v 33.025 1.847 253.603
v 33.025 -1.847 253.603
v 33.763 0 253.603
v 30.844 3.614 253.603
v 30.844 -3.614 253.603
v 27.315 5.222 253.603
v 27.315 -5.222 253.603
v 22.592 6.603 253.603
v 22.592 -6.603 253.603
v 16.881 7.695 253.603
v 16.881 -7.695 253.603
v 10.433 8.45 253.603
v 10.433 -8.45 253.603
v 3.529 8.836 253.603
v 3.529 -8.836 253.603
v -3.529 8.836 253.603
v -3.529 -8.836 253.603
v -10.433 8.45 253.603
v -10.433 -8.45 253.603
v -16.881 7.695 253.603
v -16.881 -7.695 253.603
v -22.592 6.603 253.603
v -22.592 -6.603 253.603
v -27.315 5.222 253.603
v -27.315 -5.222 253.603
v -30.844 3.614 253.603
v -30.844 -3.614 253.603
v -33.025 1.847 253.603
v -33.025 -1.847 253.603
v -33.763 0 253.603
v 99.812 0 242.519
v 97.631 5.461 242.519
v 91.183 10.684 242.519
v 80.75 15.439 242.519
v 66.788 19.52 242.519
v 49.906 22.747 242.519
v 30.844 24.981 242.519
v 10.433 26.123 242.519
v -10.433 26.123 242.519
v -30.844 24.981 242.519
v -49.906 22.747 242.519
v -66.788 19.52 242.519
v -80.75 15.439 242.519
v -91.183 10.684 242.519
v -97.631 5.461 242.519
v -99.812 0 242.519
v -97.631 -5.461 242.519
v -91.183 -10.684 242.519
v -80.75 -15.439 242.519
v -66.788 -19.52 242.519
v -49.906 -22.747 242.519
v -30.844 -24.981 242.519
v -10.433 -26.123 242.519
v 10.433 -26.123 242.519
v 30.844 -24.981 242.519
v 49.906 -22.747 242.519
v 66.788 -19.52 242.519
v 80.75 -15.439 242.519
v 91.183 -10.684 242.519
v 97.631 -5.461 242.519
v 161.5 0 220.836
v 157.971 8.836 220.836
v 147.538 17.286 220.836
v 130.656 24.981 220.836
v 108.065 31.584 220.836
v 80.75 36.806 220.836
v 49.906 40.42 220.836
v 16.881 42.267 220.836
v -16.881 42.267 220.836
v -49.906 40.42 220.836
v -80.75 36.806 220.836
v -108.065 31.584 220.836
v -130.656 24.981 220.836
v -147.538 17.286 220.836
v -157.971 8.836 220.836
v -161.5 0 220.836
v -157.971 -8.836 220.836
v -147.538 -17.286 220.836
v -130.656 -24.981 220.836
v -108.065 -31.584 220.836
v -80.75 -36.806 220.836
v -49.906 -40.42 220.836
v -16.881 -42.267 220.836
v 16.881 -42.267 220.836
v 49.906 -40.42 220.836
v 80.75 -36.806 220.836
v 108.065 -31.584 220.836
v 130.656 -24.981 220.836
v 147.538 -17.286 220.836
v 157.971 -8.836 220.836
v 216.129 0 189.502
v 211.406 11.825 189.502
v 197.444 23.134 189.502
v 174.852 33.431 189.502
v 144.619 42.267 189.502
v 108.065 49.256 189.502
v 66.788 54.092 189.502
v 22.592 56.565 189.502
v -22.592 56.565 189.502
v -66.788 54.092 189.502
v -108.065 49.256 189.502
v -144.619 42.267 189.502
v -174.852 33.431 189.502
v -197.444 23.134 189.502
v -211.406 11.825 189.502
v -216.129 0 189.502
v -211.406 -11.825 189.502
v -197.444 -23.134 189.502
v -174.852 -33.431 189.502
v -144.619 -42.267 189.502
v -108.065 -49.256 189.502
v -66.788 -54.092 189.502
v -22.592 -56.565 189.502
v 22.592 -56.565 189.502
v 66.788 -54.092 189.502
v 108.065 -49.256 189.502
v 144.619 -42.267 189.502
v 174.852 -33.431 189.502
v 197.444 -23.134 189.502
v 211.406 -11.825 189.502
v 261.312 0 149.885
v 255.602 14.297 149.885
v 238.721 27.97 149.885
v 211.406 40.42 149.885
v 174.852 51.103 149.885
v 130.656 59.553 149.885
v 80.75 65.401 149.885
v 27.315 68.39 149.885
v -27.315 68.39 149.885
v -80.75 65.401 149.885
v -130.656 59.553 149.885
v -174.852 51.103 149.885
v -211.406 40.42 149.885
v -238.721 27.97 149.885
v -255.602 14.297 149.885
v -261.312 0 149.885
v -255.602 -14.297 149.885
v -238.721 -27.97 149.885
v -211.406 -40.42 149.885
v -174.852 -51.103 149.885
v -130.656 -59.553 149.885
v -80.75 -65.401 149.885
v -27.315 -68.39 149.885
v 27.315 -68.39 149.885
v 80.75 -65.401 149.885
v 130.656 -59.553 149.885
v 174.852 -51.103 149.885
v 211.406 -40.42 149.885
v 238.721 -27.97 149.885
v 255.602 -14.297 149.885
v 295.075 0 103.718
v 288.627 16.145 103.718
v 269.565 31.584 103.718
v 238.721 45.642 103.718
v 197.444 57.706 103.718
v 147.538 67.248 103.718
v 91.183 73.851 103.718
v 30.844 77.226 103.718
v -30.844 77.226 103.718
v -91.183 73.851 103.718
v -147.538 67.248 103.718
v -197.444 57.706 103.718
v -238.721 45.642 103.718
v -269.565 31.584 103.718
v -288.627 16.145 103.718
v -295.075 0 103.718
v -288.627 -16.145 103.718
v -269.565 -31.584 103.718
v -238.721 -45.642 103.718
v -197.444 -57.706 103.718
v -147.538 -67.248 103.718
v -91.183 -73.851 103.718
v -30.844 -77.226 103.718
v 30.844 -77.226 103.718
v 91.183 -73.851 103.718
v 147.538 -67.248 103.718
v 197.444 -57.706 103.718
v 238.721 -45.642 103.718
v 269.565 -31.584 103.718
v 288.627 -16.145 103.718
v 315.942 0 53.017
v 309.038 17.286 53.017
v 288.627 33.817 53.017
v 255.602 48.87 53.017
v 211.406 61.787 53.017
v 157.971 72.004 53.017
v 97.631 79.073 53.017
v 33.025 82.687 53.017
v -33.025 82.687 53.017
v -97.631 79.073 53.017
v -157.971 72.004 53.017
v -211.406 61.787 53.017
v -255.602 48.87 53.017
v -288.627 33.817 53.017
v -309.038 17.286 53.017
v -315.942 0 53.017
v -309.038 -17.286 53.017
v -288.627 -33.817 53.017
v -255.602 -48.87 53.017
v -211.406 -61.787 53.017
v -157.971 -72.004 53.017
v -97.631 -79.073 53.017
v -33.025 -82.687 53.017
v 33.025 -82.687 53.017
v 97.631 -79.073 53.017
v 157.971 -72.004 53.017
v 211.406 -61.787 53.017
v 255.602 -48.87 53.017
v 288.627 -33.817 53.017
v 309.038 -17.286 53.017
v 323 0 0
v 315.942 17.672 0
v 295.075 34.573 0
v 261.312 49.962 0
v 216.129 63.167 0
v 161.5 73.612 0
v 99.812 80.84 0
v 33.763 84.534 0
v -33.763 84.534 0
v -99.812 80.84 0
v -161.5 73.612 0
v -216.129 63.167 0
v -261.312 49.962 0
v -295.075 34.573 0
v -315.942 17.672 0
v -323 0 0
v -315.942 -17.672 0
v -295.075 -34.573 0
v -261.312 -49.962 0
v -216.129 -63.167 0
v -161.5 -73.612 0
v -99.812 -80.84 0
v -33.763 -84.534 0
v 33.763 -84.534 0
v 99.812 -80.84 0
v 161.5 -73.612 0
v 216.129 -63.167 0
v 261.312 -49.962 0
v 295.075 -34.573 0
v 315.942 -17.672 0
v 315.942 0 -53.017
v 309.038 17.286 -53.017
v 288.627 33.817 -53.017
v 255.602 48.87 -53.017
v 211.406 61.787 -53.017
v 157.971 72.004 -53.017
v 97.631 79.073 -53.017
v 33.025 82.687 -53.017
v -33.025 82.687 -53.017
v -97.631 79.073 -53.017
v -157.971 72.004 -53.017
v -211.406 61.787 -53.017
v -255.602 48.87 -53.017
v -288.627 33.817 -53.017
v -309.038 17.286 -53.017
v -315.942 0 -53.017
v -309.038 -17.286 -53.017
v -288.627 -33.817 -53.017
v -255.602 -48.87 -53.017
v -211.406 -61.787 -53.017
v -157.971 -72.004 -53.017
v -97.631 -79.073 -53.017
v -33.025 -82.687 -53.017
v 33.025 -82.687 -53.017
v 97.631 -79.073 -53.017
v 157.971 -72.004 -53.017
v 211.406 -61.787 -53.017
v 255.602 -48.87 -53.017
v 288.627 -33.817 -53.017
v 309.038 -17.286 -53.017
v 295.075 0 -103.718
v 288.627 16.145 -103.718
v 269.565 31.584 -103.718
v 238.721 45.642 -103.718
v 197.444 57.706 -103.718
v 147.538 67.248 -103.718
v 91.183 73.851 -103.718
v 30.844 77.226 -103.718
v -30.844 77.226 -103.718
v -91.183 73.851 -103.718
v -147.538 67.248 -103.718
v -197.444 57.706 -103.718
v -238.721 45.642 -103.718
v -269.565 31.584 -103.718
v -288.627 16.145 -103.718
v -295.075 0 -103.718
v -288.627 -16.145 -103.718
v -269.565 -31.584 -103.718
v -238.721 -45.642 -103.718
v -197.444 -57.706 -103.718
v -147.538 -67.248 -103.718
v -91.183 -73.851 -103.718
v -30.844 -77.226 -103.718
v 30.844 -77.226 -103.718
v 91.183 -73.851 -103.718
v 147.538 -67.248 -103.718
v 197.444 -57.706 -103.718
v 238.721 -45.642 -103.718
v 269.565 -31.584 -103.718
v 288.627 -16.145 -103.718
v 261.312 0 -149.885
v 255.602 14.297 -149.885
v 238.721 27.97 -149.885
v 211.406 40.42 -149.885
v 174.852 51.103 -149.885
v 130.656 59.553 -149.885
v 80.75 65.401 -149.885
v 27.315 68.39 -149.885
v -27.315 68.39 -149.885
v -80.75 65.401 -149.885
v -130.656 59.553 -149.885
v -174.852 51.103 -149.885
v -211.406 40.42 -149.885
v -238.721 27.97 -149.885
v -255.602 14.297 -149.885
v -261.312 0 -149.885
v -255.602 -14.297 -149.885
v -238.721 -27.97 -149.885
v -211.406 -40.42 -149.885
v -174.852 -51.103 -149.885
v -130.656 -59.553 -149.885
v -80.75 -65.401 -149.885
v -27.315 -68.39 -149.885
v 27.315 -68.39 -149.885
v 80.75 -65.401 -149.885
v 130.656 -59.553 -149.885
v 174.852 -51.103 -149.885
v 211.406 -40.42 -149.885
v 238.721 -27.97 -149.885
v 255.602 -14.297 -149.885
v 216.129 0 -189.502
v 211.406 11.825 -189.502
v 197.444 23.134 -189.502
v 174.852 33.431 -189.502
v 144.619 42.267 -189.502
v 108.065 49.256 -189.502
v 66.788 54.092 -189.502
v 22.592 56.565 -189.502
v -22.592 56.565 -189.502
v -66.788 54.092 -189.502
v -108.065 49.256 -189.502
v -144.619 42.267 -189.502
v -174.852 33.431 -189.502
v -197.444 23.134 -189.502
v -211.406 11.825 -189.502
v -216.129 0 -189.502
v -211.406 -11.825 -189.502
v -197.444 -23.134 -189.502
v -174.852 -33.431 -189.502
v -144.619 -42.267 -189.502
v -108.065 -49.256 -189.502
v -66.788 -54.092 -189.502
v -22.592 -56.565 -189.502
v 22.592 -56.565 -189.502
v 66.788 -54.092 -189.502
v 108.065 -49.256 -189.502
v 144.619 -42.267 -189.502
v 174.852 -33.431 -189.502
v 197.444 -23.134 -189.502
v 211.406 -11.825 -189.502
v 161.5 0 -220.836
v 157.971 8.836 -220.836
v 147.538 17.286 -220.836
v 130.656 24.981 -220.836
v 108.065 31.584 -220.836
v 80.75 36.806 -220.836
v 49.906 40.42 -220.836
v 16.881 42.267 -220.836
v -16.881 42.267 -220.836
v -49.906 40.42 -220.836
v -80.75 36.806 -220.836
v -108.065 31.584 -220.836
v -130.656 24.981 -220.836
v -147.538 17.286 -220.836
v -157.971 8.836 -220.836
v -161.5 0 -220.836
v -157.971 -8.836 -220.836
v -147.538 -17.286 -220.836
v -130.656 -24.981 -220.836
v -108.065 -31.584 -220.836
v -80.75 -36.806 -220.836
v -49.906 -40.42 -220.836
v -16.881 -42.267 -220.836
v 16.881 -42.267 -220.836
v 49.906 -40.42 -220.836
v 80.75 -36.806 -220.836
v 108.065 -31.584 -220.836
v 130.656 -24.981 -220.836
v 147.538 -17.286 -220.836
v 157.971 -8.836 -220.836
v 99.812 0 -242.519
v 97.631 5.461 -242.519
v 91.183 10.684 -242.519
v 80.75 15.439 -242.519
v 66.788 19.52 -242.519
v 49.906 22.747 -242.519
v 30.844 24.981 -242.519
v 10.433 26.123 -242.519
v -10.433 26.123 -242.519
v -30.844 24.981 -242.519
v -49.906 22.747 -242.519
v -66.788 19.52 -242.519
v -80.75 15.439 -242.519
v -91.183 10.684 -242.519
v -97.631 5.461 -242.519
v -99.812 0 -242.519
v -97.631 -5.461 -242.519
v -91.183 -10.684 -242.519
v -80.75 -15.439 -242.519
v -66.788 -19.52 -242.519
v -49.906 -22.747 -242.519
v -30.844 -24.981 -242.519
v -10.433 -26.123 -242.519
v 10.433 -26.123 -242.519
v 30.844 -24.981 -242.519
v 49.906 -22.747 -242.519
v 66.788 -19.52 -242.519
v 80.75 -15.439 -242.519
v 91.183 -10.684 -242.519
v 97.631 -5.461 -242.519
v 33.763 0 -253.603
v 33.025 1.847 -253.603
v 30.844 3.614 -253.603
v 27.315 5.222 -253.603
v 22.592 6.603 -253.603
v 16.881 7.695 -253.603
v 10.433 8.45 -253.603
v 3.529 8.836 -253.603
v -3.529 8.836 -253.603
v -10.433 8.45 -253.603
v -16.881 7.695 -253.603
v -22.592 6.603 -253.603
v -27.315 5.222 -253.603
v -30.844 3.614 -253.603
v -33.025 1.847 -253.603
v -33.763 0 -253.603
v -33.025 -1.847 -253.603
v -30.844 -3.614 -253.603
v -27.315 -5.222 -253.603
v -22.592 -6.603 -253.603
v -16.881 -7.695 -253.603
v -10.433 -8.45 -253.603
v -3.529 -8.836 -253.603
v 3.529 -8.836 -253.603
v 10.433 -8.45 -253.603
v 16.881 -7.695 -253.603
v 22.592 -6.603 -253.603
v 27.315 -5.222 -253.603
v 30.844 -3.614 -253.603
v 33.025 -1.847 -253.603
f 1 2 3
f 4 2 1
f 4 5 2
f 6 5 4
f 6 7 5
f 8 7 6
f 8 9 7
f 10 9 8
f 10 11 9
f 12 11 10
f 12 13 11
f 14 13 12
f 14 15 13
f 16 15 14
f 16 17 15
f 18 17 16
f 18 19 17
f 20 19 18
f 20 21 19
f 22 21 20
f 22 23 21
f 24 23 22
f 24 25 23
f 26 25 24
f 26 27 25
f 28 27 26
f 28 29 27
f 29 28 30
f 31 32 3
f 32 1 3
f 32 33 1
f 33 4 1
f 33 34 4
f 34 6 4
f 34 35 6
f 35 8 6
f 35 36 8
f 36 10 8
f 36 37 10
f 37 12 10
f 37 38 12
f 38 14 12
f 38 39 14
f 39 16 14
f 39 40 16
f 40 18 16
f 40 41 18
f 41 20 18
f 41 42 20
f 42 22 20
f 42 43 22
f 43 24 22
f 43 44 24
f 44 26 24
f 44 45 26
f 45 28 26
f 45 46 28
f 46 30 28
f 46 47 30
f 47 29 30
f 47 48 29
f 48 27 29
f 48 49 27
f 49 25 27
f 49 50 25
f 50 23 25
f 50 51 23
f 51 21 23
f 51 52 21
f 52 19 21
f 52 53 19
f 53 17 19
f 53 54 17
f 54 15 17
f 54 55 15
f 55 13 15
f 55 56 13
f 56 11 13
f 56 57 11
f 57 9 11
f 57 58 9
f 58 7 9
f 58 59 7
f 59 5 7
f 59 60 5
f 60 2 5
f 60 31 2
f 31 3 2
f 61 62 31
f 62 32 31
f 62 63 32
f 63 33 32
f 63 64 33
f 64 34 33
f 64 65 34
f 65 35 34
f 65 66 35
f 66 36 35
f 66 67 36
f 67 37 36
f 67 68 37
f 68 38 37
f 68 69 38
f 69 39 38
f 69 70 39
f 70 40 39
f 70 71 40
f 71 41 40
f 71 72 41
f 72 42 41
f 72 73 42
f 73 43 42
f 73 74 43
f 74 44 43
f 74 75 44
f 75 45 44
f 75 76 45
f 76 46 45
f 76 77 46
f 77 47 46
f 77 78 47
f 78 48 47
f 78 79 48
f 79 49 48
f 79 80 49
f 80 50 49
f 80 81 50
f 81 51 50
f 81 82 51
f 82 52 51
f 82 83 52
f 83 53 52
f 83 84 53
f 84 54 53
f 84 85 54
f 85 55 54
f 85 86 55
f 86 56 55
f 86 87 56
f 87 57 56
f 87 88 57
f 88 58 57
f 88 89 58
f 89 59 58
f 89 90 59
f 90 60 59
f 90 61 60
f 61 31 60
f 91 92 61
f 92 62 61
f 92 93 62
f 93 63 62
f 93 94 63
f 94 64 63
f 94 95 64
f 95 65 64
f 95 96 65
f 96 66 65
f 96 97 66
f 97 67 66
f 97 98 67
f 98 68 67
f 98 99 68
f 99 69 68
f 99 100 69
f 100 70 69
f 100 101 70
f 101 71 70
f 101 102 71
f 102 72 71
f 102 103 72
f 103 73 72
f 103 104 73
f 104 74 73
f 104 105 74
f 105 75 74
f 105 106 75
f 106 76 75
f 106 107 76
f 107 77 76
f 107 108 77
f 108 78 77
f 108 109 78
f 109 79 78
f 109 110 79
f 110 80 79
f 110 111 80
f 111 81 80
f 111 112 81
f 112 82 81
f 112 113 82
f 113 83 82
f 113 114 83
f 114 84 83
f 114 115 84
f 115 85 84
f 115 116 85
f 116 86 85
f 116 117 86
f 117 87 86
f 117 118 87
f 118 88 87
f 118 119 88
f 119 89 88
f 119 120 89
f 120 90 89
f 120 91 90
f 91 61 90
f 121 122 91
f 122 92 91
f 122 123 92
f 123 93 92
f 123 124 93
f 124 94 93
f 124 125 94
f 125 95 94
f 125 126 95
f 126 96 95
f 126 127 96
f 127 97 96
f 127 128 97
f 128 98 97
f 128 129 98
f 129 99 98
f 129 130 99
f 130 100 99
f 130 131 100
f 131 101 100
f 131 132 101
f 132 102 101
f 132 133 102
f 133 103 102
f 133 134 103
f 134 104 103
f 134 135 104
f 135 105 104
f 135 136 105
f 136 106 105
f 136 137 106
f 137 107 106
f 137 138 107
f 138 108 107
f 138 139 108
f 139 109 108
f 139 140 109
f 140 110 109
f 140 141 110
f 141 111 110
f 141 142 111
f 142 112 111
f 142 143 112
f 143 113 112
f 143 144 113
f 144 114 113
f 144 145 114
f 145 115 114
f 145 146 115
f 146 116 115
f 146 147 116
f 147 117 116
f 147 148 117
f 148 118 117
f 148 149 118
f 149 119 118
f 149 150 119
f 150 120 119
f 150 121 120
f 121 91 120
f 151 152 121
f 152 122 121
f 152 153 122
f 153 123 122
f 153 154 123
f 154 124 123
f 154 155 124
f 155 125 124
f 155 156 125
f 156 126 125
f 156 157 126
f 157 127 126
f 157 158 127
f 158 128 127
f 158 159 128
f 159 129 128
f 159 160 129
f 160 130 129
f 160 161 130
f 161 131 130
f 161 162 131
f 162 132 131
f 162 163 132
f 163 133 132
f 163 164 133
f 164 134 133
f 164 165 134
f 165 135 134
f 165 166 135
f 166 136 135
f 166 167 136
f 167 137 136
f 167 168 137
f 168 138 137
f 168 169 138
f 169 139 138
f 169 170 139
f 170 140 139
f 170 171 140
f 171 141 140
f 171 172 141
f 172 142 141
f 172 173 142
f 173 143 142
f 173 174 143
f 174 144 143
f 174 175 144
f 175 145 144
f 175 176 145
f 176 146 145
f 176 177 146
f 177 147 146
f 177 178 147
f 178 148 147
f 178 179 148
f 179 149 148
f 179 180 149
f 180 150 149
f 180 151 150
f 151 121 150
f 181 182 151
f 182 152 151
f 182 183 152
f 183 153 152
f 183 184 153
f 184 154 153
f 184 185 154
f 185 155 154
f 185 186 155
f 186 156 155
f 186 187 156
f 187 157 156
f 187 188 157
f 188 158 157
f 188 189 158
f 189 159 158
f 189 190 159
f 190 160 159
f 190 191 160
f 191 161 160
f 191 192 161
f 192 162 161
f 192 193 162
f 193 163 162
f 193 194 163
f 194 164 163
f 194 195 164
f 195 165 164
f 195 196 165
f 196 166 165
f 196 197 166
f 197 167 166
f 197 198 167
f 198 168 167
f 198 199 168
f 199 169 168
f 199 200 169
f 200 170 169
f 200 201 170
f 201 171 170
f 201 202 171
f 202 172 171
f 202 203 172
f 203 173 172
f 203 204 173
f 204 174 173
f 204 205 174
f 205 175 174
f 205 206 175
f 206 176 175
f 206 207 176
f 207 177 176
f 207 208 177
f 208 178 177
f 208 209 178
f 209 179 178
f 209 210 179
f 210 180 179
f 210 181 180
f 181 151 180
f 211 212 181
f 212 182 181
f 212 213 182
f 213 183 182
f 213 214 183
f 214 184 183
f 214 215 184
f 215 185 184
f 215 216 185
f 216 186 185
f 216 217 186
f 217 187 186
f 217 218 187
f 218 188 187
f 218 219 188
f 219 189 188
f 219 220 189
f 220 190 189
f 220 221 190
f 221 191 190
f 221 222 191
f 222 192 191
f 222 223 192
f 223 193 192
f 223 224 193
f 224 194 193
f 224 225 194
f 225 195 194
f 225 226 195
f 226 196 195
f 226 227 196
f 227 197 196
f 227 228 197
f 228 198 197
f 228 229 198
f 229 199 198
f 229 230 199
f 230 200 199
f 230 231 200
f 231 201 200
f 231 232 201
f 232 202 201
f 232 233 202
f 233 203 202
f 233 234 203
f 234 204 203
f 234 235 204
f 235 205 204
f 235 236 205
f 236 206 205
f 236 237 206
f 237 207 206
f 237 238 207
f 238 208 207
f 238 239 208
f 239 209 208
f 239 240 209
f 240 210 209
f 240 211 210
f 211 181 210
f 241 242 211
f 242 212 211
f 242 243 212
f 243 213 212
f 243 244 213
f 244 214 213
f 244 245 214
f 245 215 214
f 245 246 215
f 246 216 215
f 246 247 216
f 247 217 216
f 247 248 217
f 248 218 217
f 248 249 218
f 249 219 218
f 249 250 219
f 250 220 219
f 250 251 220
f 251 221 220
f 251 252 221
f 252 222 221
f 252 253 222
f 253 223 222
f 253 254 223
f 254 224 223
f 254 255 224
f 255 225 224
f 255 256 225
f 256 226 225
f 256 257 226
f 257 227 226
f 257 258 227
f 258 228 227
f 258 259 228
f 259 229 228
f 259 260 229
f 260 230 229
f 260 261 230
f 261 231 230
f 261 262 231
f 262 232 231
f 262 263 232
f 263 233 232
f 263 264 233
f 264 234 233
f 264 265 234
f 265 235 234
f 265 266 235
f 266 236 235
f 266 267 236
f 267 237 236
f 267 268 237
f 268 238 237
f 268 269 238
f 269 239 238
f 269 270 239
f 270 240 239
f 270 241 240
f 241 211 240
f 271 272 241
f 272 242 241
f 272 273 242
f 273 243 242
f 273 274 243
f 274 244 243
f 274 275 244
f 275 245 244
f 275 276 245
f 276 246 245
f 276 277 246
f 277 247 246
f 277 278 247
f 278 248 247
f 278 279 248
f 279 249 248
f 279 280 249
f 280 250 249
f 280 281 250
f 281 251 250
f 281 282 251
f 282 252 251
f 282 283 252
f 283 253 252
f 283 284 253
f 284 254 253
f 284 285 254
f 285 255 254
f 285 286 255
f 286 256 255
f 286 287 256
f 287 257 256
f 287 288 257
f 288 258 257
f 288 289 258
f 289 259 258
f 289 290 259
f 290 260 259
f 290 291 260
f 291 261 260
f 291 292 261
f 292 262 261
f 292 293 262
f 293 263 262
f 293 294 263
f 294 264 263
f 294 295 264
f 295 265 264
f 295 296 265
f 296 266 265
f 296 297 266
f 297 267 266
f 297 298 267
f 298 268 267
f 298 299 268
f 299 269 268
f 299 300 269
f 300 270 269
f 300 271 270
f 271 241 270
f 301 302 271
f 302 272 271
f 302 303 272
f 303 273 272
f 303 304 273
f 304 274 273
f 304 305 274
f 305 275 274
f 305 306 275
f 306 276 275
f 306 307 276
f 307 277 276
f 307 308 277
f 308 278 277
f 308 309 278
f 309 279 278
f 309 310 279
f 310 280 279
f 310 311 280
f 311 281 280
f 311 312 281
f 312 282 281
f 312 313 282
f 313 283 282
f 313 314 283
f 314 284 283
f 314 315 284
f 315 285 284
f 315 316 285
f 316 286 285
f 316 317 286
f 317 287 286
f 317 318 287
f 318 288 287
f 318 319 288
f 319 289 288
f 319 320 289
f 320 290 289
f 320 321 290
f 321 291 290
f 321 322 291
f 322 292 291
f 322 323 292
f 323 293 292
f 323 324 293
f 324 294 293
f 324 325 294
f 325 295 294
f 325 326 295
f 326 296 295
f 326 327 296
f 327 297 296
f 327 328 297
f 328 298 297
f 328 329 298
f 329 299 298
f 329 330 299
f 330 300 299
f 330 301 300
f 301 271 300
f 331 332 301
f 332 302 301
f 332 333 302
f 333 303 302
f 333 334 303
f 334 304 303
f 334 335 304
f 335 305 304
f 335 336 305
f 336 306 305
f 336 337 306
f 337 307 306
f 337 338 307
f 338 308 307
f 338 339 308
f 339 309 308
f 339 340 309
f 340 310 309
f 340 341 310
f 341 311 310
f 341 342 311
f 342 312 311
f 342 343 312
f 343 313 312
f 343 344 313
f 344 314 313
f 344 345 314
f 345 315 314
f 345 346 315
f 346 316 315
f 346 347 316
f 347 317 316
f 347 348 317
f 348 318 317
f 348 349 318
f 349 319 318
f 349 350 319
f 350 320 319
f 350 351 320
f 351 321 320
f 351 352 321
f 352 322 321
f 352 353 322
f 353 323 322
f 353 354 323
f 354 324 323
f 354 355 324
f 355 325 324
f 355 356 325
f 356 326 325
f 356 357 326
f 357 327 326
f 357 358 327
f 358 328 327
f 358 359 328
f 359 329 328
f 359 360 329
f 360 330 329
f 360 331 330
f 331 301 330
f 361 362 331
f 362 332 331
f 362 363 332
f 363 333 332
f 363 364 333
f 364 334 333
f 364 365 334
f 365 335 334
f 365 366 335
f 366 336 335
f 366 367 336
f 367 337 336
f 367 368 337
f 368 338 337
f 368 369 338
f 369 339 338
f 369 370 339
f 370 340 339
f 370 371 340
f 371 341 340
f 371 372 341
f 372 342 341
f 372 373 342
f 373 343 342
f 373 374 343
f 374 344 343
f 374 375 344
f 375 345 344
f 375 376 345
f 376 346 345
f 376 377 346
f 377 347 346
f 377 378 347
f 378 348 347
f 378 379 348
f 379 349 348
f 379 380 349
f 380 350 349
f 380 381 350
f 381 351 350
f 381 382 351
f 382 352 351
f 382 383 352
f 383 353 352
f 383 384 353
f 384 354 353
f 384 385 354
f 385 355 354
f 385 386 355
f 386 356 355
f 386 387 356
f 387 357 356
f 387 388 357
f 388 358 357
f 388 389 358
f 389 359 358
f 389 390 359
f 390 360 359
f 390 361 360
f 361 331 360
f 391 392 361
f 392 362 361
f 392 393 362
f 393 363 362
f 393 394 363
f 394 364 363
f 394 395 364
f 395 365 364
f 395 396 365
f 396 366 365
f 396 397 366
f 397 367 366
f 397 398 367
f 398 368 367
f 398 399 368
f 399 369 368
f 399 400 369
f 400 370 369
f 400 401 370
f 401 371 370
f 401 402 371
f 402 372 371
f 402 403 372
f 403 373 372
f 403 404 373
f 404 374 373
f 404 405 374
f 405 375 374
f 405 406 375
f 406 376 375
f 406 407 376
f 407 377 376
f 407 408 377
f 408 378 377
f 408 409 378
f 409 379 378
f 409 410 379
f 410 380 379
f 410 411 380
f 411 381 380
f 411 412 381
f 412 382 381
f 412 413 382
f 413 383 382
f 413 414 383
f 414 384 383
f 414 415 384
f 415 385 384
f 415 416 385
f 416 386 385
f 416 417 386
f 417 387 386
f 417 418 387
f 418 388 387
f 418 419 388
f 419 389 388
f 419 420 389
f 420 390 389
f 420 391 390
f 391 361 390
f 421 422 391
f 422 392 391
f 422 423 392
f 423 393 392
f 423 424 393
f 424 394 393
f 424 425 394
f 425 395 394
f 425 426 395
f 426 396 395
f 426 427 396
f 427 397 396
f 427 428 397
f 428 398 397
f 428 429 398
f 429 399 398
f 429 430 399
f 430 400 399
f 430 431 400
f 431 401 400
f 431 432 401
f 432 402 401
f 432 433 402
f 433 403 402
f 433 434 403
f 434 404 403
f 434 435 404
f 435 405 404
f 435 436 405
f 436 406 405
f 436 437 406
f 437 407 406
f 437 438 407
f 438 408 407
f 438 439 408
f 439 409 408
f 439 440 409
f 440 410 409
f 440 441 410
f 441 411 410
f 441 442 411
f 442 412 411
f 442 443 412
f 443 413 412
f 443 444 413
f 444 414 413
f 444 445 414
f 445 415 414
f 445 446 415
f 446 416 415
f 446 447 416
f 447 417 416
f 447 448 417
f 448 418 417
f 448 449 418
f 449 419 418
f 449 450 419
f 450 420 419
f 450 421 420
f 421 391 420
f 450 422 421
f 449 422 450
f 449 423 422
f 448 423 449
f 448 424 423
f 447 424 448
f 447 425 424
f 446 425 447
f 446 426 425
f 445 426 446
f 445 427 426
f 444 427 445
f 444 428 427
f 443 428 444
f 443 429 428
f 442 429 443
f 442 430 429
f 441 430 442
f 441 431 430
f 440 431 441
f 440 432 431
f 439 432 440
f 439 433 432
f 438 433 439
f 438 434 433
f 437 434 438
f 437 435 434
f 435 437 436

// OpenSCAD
// Generated by SolidPython 1.0.1 on 2020-07-29 00:46:53


scale(v = [19, 5, 15]) {
	sphere(r = 17);
}
/***********************************************
*********      SolidPython code:      **********
************************************************
 
# import packages: SolidPython
from solid import *
from solid.utils import *
from itertools import chain, combinations, permutations


class Resize:

    def __init__(self, scad_file):
        self.scad_file = scad_file
        #self.scad_file = import_scad(scad_file)
        # cone/cylinder param:
        self.r1 = 0
        self.r2 = 0
        self.h = 0
        # rectangular prism param:
        self.w = 0
        self.l = 0
        # ellipse param:
        self.r = 0

    # import OpenScad code (file name corresponds to shape)


    # classify shape + parameters
    def assign(self, param1, param2, param3):
        if self.scad_file == 'cone.scad':
            self.r1 = param1
            self.r2 = param2
            self.h = param3
        elif self.scad_file == 'cylinder.scad':
            self.r1 = param1
            self.r2 = param2
            self.h = param3
        elif self.scad_file == 'rectangularPrism.scad':
            self.h = param1
            self.l = param2
            self.w = param3
        else:
            self.r = param1
            self.h = param2

    # resize parameters
    def iterate(self):
        x = range(3, 20, 2)
        i = 1
        if self.scad_file == 'cone.scad':
            tempList = list(permutations(x, 2))
            for temp in tempList:
                param1 = temp[0]
                param2 = temp[1]
                filepath = 'produced_scad_files/' + 'cone' + str(param1) + '_' + str(param2) + '_' + '.scad'
                scad_render_to_file(cylinder(h=param1, r1=param2, r2=0), filepath)

        elif self.scad_file == 'cylinder.scad':
            tempList = list(permutations(x, 3))
            for temp in tempList:
                param1 = temp[0]
                param2 = temp[1]
                filepath = 'produced_scad_files/' + 'cylinder' + str(param1) + '_' + str(param2) + '_' + '.scad'
                scad_render_to_file(cylinder(h=param1, r1=param2, r2=param2), filepath)

        elif self.scad_file == 'rectangularPrism.scad':
            tempList = list(permutations(x, 3))
            for temp in tempList:
                param1 = temp[0]
                param2 = temp[1]
                param3 = temp[2]
                filepath = 'produced_scad_files/' + 'rectangularPrism' + str(param1) + '_' + str(param2) + '_' + str(
                    param3) + '.scad'
                scad_render_to_file(cube(size=(param1, param2, param3)), filepath)

        elif self.scad_file == 'ellipse.scad':
            tempList = list(permutations(x, 4))
            for temp in tempList:
                param1 = temp[0]
                param2 = temp[1]
                param3 = temp[2]
                param4 = temp[3]
                filepath = 'produced_scad_files/' + 'ellipse' + str(param1) + '_' + str(param2) + '_' + str(param3) + '_' + str(param4) + '.scad'
                scad_render_to_file(scale([param1, param2, param3])(sphere(r=param4)), filepath)

    def render_to_scadfile(self):
        scad_render_to_file(scad, 'example.scad') 
 
************************************************/
